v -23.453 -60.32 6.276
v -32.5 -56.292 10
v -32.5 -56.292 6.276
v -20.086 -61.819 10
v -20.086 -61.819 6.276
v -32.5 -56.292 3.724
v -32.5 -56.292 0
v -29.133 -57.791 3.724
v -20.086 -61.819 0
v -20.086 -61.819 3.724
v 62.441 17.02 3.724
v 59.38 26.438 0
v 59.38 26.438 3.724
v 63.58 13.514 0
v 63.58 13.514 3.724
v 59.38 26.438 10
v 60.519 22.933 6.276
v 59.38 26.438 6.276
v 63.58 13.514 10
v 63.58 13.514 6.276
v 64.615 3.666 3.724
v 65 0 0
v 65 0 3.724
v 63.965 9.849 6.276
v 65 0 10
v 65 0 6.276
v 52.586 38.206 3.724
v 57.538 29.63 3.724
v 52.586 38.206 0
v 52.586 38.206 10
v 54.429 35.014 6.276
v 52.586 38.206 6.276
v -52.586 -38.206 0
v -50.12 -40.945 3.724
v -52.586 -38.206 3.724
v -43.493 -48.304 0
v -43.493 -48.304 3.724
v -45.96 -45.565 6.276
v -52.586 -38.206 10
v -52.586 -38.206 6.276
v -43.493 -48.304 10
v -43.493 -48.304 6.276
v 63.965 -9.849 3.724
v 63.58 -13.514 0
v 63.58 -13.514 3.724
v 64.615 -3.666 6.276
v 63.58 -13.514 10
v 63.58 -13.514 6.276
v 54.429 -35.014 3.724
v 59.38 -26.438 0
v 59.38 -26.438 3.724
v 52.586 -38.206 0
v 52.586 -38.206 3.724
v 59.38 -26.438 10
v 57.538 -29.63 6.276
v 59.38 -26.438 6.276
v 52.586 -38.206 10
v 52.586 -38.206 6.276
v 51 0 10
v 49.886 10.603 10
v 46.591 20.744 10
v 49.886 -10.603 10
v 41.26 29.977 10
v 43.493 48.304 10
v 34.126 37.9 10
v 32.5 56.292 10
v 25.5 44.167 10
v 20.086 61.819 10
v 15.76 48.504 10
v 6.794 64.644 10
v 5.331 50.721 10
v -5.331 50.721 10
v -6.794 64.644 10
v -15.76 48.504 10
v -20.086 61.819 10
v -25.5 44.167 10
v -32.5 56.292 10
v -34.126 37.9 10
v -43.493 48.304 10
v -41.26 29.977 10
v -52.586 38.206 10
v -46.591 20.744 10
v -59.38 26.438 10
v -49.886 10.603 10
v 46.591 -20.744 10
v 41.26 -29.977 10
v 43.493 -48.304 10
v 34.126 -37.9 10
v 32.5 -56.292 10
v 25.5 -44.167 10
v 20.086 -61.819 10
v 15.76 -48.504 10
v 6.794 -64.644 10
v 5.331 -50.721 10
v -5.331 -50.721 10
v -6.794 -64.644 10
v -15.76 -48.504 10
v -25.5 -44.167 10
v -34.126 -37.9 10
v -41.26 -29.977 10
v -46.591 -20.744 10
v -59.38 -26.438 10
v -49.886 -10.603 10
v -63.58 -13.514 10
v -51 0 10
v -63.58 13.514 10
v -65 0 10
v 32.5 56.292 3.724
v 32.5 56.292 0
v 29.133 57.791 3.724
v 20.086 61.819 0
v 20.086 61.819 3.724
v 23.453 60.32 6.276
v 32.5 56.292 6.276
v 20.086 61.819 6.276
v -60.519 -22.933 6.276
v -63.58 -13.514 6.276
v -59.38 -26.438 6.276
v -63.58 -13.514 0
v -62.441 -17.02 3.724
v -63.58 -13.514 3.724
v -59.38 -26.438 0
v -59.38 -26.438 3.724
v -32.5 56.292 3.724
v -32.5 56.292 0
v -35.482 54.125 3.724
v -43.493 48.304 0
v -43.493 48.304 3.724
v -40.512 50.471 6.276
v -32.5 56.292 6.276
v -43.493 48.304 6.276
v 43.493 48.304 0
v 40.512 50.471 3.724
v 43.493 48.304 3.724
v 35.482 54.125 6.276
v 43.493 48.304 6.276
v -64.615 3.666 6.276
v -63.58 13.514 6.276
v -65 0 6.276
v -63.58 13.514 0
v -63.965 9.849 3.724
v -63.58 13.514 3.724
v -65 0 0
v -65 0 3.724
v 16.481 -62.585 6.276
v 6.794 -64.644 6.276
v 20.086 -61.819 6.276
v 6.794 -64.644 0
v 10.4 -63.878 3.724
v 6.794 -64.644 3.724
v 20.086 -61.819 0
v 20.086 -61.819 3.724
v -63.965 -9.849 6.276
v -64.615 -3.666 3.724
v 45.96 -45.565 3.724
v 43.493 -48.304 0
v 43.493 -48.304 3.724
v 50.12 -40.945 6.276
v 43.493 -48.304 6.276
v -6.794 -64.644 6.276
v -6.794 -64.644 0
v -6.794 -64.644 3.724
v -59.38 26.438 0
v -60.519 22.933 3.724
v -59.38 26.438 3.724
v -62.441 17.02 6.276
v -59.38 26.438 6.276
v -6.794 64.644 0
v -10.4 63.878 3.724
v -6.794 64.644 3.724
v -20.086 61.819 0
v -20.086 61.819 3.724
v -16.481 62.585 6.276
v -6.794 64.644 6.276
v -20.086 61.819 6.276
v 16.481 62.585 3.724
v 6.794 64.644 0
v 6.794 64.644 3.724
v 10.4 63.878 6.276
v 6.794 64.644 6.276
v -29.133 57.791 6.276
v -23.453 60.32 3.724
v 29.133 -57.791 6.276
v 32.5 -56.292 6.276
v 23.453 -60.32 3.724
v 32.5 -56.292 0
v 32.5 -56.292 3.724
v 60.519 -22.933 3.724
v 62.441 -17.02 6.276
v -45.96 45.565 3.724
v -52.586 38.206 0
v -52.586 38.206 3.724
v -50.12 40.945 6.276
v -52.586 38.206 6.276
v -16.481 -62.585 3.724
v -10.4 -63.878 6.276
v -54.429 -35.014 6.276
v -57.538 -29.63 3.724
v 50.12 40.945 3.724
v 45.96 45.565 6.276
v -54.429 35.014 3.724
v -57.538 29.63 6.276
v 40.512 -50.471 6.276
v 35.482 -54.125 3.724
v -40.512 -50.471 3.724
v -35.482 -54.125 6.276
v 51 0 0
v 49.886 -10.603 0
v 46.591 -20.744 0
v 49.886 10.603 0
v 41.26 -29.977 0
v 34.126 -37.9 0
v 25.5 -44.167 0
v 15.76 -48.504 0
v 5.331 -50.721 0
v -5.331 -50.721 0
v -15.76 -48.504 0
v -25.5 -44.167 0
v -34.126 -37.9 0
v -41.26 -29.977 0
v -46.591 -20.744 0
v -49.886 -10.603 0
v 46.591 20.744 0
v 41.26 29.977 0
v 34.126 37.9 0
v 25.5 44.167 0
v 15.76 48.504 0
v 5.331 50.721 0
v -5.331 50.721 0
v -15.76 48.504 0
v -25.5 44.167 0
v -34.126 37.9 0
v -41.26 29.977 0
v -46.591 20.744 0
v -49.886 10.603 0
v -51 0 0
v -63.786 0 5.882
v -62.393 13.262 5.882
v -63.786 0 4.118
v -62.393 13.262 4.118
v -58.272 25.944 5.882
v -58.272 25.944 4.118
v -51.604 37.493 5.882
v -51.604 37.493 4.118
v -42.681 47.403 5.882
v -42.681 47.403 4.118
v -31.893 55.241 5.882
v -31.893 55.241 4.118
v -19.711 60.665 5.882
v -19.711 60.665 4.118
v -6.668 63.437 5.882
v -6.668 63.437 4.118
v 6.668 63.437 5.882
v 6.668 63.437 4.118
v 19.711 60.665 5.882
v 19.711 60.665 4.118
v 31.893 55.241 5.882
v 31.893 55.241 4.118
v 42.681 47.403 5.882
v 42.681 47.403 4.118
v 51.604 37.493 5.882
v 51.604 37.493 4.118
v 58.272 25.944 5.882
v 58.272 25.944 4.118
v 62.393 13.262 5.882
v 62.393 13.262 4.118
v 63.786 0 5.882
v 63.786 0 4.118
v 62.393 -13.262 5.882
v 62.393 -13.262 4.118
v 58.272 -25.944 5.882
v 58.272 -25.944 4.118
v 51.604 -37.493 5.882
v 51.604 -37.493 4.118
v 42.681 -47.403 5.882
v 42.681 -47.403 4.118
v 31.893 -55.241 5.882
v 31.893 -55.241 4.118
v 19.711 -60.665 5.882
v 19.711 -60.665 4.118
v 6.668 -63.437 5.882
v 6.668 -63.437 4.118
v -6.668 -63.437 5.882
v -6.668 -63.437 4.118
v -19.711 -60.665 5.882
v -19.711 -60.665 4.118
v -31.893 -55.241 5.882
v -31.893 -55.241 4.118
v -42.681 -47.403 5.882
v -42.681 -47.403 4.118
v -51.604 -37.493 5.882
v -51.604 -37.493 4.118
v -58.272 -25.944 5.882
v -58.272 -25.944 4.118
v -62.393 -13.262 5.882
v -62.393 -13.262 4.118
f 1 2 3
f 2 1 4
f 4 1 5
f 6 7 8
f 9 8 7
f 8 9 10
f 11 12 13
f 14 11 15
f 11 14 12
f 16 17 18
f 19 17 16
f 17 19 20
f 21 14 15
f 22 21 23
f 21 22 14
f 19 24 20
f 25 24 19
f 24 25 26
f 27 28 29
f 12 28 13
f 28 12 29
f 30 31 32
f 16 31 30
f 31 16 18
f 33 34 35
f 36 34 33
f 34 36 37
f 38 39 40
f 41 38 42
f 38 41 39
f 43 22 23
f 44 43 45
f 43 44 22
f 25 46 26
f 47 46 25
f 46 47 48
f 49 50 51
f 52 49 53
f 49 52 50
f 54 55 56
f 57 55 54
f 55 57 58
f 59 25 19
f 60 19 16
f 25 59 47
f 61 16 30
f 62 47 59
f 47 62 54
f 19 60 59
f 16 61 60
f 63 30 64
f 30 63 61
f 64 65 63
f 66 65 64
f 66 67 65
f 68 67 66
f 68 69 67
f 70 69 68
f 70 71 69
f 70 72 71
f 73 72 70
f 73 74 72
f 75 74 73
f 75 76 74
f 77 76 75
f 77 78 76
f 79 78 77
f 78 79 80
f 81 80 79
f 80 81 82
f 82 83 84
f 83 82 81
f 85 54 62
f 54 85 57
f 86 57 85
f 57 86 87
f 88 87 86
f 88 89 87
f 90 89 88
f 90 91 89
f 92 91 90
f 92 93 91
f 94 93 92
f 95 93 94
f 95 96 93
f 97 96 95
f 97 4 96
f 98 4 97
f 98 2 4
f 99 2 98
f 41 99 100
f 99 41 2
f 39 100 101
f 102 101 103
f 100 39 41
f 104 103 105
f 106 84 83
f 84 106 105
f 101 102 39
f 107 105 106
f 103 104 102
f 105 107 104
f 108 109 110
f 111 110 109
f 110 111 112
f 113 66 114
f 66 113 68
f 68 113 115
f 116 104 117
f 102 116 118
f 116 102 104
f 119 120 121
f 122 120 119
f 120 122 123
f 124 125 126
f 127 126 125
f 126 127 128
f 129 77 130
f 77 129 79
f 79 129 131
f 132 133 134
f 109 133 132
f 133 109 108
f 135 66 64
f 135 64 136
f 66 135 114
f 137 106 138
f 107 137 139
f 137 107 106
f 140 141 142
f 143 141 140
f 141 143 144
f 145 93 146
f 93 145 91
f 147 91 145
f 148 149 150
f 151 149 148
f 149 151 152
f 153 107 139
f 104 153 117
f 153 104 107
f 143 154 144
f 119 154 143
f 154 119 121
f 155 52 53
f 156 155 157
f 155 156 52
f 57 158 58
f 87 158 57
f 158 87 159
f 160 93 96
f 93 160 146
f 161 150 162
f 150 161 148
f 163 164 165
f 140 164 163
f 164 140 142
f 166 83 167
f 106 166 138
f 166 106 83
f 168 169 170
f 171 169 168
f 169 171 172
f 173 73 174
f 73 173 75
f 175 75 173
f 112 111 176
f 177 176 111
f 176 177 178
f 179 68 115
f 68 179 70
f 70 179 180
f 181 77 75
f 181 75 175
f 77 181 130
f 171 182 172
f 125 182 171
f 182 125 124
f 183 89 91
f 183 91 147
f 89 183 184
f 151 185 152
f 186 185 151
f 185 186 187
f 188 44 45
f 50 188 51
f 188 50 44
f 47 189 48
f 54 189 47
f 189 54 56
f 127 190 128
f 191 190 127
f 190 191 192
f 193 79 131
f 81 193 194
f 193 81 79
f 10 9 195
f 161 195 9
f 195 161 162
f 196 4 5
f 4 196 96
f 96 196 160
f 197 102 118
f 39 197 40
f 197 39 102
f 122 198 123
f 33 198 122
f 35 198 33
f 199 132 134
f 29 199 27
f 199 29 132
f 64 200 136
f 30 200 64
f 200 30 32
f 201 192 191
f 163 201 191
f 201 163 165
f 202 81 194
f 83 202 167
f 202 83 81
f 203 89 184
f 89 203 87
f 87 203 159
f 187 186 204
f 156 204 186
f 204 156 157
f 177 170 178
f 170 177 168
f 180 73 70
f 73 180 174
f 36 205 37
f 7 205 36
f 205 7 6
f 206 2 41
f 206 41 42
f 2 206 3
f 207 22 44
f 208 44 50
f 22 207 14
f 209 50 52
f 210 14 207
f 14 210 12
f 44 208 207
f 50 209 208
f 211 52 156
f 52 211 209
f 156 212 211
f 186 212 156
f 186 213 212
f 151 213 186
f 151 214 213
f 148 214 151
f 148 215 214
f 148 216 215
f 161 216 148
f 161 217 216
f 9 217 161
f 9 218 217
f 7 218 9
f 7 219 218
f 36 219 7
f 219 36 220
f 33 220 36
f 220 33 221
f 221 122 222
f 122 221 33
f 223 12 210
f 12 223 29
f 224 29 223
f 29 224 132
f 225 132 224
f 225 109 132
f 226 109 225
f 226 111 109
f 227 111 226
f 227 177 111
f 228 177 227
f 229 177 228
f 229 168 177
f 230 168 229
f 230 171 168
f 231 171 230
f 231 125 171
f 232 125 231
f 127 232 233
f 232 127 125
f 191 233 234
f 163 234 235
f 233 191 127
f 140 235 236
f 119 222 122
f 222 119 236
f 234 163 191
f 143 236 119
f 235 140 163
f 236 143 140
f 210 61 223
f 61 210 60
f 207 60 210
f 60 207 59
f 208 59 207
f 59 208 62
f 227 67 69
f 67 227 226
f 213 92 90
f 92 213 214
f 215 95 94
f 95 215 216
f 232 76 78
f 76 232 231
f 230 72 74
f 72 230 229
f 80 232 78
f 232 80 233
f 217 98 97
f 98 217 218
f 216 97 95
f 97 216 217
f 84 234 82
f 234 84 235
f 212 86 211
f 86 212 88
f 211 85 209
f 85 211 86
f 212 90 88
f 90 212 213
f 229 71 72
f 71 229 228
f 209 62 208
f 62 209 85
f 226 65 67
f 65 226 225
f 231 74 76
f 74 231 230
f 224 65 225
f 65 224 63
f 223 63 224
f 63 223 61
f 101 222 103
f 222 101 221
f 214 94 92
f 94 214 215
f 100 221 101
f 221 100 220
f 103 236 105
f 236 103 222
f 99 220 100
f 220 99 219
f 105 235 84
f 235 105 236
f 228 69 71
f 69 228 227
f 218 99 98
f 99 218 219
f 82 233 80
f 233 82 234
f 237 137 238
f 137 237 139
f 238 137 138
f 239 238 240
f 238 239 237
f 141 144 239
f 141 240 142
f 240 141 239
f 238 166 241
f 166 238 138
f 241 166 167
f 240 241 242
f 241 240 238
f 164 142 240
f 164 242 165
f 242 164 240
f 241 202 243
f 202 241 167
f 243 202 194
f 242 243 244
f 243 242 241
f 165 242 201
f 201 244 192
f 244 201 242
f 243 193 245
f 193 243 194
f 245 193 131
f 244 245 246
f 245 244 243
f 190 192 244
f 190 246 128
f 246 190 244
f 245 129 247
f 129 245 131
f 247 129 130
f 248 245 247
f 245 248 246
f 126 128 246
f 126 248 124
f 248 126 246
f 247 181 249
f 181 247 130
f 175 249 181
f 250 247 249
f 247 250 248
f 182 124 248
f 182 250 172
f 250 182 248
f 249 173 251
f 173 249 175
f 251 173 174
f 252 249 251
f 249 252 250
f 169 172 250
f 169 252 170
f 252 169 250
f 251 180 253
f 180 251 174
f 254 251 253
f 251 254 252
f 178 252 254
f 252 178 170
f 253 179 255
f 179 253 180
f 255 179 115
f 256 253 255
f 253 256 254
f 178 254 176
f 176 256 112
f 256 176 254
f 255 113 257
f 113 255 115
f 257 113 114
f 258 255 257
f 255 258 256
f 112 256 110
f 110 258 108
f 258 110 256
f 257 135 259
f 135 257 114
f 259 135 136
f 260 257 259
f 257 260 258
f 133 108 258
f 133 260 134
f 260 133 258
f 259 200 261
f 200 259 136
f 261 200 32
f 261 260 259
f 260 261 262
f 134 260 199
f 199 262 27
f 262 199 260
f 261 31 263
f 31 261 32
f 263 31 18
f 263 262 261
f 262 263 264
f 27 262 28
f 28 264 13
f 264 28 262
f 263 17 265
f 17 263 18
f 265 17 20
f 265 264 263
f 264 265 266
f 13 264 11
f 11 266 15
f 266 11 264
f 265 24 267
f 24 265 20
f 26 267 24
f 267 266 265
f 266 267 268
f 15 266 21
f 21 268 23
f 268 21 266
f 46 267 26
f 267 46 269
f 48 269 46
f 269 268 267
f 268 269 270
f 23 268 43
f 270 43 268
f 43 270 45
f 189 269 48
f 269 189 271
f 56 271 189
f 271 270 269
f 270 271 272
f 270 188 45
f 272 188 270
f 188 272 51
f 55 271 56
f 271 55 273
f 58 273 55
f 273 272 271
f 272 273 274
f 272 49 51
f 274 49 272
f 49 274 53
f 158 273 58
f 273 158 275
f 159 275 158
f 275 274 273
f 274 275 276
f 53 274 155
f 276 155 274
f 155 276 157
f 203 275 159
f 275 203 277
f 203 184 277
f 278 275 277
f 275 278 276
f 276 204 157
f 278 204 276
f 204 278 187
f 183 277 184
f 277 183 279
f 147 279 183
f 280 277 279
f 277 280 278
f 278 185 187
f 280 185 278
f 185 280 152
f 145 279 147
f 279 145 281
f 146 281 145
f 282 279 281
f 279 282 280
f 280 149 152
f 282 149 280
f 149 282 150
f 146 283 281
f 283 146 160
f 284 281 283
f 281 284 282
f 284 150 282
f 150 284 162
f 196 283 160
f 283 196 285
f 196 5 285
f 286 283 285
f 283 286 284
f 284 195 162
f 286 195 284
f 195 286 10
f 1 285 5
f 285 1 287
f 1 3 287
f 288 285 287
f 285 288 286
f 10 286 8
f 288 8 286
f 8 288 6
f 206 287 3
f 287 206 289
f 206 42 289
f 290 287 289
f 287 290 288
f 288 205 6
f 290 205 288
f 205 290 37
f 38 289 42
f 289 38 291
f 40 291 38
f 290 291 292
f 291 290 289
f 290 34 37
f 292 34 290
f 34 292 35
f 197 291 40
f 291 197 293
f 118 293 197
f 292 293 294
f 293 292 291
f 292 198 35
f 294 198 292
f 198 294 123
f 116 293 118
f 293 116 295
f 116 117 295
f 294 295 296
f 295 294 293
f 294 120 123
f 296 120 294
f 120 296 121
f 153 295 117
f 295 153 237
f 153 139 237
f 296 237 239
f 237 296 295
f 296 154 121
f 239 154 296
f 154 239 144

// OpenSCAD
/*
ISO-K vacuum flanges for OpenSCAD
This is free and unencumbered software released into the public domain.

Anyone is free to copy, modify, publish, use, compile, sell, or
distribute this software, either in source code form or as a compiled
binary, for any purpose, commercial or non-commercial, and by any
means.

In jurisdictions that recognize copyright laws, the author or authors
of this software dedicate any and all copyright interest in the
software to the public domain. We make this dedication for the benefit
of the public at large and to the detriment of our heirs and
successors. We intend this dedication to be an overt act of
relinquishment in perpetuity of all present and future rights to this
software under copyright law.

THE SOFTWARE IS PROVIDED "AS IS", WITHOUT WARRANTY OF ANY KIND,
EXPRESS OR IMPLIED, INCLUDING BUT NOT LIMITED TO THE WARRANTIES OF
MERCHANTABILITY, FITNESS FOR A PARTICULAR PURPOSE AND NONINFRINGEMENT.
IN NO EVENT SHALL THE AUTHORS BE LIABLE FOR ANY CLAIM, DAMAGES OR
OTHER LIABILITY, WHETHER IN AN ACTION OF CONTRACT, TORT OR OTHERWISE,
ARISING FROM, OUT OF OR IN CONNECTION WITH THE SOFTWARE OR THE USE OR
OTHER DEALINGS IN THE SOFTWARE.

For more information, please refer to <https://unlicense.org/>

Based on blueprints from https://www.tracepartsonline.net/(S(c314dufymcnxxurthiwo4pow))/PartDetails.aspx?PartFamilyID=30-03062015-098588&PartID=30-03062015-098588 , but should not be copyrightable.
*/

module ISOKFlange(partLen = 108.0,
	innerDiameter = 102,
	outerDiameter = 108,
	ringWidth = 2.4,
	flangeDiameter = 130,
	flangeSize = 12,
	ridgeDepth = 2,
	grooveRadius = 1.5,
	grooveOffset = 5.0) {
	
	flangeInnerSize = flangeSize-ridgeDepth;
	middleSegmentSize=partLen-flangeInnerSize;

	group() {
		group() {
			difference() {
				difference() {
					cylinder(h = partLen, d = flangeDiameter, center = false);
					cylinder(h = partLen, d = innerDiameter, center = false);
					translate([0,0,partLen-grooveOffset]) {
						rotate_extrude()
						translate([flangeDiameter/2,0,0])
						circle(r = grooveRadius);
					}
				}
				difference() {
					union() {
						cylinder(h = middleSegmentSize, d = flangeDiameter-ringWidth, center = false);
						cylinder(h = partLen-flangeSize, d = flangeDiameter);
					}
					cylinder(h = middleSegmentSize, d = outerDiameter);
				}
			}
		}
	}
}
ISOKFlange(10);  // this file is meant to be imported, not included
